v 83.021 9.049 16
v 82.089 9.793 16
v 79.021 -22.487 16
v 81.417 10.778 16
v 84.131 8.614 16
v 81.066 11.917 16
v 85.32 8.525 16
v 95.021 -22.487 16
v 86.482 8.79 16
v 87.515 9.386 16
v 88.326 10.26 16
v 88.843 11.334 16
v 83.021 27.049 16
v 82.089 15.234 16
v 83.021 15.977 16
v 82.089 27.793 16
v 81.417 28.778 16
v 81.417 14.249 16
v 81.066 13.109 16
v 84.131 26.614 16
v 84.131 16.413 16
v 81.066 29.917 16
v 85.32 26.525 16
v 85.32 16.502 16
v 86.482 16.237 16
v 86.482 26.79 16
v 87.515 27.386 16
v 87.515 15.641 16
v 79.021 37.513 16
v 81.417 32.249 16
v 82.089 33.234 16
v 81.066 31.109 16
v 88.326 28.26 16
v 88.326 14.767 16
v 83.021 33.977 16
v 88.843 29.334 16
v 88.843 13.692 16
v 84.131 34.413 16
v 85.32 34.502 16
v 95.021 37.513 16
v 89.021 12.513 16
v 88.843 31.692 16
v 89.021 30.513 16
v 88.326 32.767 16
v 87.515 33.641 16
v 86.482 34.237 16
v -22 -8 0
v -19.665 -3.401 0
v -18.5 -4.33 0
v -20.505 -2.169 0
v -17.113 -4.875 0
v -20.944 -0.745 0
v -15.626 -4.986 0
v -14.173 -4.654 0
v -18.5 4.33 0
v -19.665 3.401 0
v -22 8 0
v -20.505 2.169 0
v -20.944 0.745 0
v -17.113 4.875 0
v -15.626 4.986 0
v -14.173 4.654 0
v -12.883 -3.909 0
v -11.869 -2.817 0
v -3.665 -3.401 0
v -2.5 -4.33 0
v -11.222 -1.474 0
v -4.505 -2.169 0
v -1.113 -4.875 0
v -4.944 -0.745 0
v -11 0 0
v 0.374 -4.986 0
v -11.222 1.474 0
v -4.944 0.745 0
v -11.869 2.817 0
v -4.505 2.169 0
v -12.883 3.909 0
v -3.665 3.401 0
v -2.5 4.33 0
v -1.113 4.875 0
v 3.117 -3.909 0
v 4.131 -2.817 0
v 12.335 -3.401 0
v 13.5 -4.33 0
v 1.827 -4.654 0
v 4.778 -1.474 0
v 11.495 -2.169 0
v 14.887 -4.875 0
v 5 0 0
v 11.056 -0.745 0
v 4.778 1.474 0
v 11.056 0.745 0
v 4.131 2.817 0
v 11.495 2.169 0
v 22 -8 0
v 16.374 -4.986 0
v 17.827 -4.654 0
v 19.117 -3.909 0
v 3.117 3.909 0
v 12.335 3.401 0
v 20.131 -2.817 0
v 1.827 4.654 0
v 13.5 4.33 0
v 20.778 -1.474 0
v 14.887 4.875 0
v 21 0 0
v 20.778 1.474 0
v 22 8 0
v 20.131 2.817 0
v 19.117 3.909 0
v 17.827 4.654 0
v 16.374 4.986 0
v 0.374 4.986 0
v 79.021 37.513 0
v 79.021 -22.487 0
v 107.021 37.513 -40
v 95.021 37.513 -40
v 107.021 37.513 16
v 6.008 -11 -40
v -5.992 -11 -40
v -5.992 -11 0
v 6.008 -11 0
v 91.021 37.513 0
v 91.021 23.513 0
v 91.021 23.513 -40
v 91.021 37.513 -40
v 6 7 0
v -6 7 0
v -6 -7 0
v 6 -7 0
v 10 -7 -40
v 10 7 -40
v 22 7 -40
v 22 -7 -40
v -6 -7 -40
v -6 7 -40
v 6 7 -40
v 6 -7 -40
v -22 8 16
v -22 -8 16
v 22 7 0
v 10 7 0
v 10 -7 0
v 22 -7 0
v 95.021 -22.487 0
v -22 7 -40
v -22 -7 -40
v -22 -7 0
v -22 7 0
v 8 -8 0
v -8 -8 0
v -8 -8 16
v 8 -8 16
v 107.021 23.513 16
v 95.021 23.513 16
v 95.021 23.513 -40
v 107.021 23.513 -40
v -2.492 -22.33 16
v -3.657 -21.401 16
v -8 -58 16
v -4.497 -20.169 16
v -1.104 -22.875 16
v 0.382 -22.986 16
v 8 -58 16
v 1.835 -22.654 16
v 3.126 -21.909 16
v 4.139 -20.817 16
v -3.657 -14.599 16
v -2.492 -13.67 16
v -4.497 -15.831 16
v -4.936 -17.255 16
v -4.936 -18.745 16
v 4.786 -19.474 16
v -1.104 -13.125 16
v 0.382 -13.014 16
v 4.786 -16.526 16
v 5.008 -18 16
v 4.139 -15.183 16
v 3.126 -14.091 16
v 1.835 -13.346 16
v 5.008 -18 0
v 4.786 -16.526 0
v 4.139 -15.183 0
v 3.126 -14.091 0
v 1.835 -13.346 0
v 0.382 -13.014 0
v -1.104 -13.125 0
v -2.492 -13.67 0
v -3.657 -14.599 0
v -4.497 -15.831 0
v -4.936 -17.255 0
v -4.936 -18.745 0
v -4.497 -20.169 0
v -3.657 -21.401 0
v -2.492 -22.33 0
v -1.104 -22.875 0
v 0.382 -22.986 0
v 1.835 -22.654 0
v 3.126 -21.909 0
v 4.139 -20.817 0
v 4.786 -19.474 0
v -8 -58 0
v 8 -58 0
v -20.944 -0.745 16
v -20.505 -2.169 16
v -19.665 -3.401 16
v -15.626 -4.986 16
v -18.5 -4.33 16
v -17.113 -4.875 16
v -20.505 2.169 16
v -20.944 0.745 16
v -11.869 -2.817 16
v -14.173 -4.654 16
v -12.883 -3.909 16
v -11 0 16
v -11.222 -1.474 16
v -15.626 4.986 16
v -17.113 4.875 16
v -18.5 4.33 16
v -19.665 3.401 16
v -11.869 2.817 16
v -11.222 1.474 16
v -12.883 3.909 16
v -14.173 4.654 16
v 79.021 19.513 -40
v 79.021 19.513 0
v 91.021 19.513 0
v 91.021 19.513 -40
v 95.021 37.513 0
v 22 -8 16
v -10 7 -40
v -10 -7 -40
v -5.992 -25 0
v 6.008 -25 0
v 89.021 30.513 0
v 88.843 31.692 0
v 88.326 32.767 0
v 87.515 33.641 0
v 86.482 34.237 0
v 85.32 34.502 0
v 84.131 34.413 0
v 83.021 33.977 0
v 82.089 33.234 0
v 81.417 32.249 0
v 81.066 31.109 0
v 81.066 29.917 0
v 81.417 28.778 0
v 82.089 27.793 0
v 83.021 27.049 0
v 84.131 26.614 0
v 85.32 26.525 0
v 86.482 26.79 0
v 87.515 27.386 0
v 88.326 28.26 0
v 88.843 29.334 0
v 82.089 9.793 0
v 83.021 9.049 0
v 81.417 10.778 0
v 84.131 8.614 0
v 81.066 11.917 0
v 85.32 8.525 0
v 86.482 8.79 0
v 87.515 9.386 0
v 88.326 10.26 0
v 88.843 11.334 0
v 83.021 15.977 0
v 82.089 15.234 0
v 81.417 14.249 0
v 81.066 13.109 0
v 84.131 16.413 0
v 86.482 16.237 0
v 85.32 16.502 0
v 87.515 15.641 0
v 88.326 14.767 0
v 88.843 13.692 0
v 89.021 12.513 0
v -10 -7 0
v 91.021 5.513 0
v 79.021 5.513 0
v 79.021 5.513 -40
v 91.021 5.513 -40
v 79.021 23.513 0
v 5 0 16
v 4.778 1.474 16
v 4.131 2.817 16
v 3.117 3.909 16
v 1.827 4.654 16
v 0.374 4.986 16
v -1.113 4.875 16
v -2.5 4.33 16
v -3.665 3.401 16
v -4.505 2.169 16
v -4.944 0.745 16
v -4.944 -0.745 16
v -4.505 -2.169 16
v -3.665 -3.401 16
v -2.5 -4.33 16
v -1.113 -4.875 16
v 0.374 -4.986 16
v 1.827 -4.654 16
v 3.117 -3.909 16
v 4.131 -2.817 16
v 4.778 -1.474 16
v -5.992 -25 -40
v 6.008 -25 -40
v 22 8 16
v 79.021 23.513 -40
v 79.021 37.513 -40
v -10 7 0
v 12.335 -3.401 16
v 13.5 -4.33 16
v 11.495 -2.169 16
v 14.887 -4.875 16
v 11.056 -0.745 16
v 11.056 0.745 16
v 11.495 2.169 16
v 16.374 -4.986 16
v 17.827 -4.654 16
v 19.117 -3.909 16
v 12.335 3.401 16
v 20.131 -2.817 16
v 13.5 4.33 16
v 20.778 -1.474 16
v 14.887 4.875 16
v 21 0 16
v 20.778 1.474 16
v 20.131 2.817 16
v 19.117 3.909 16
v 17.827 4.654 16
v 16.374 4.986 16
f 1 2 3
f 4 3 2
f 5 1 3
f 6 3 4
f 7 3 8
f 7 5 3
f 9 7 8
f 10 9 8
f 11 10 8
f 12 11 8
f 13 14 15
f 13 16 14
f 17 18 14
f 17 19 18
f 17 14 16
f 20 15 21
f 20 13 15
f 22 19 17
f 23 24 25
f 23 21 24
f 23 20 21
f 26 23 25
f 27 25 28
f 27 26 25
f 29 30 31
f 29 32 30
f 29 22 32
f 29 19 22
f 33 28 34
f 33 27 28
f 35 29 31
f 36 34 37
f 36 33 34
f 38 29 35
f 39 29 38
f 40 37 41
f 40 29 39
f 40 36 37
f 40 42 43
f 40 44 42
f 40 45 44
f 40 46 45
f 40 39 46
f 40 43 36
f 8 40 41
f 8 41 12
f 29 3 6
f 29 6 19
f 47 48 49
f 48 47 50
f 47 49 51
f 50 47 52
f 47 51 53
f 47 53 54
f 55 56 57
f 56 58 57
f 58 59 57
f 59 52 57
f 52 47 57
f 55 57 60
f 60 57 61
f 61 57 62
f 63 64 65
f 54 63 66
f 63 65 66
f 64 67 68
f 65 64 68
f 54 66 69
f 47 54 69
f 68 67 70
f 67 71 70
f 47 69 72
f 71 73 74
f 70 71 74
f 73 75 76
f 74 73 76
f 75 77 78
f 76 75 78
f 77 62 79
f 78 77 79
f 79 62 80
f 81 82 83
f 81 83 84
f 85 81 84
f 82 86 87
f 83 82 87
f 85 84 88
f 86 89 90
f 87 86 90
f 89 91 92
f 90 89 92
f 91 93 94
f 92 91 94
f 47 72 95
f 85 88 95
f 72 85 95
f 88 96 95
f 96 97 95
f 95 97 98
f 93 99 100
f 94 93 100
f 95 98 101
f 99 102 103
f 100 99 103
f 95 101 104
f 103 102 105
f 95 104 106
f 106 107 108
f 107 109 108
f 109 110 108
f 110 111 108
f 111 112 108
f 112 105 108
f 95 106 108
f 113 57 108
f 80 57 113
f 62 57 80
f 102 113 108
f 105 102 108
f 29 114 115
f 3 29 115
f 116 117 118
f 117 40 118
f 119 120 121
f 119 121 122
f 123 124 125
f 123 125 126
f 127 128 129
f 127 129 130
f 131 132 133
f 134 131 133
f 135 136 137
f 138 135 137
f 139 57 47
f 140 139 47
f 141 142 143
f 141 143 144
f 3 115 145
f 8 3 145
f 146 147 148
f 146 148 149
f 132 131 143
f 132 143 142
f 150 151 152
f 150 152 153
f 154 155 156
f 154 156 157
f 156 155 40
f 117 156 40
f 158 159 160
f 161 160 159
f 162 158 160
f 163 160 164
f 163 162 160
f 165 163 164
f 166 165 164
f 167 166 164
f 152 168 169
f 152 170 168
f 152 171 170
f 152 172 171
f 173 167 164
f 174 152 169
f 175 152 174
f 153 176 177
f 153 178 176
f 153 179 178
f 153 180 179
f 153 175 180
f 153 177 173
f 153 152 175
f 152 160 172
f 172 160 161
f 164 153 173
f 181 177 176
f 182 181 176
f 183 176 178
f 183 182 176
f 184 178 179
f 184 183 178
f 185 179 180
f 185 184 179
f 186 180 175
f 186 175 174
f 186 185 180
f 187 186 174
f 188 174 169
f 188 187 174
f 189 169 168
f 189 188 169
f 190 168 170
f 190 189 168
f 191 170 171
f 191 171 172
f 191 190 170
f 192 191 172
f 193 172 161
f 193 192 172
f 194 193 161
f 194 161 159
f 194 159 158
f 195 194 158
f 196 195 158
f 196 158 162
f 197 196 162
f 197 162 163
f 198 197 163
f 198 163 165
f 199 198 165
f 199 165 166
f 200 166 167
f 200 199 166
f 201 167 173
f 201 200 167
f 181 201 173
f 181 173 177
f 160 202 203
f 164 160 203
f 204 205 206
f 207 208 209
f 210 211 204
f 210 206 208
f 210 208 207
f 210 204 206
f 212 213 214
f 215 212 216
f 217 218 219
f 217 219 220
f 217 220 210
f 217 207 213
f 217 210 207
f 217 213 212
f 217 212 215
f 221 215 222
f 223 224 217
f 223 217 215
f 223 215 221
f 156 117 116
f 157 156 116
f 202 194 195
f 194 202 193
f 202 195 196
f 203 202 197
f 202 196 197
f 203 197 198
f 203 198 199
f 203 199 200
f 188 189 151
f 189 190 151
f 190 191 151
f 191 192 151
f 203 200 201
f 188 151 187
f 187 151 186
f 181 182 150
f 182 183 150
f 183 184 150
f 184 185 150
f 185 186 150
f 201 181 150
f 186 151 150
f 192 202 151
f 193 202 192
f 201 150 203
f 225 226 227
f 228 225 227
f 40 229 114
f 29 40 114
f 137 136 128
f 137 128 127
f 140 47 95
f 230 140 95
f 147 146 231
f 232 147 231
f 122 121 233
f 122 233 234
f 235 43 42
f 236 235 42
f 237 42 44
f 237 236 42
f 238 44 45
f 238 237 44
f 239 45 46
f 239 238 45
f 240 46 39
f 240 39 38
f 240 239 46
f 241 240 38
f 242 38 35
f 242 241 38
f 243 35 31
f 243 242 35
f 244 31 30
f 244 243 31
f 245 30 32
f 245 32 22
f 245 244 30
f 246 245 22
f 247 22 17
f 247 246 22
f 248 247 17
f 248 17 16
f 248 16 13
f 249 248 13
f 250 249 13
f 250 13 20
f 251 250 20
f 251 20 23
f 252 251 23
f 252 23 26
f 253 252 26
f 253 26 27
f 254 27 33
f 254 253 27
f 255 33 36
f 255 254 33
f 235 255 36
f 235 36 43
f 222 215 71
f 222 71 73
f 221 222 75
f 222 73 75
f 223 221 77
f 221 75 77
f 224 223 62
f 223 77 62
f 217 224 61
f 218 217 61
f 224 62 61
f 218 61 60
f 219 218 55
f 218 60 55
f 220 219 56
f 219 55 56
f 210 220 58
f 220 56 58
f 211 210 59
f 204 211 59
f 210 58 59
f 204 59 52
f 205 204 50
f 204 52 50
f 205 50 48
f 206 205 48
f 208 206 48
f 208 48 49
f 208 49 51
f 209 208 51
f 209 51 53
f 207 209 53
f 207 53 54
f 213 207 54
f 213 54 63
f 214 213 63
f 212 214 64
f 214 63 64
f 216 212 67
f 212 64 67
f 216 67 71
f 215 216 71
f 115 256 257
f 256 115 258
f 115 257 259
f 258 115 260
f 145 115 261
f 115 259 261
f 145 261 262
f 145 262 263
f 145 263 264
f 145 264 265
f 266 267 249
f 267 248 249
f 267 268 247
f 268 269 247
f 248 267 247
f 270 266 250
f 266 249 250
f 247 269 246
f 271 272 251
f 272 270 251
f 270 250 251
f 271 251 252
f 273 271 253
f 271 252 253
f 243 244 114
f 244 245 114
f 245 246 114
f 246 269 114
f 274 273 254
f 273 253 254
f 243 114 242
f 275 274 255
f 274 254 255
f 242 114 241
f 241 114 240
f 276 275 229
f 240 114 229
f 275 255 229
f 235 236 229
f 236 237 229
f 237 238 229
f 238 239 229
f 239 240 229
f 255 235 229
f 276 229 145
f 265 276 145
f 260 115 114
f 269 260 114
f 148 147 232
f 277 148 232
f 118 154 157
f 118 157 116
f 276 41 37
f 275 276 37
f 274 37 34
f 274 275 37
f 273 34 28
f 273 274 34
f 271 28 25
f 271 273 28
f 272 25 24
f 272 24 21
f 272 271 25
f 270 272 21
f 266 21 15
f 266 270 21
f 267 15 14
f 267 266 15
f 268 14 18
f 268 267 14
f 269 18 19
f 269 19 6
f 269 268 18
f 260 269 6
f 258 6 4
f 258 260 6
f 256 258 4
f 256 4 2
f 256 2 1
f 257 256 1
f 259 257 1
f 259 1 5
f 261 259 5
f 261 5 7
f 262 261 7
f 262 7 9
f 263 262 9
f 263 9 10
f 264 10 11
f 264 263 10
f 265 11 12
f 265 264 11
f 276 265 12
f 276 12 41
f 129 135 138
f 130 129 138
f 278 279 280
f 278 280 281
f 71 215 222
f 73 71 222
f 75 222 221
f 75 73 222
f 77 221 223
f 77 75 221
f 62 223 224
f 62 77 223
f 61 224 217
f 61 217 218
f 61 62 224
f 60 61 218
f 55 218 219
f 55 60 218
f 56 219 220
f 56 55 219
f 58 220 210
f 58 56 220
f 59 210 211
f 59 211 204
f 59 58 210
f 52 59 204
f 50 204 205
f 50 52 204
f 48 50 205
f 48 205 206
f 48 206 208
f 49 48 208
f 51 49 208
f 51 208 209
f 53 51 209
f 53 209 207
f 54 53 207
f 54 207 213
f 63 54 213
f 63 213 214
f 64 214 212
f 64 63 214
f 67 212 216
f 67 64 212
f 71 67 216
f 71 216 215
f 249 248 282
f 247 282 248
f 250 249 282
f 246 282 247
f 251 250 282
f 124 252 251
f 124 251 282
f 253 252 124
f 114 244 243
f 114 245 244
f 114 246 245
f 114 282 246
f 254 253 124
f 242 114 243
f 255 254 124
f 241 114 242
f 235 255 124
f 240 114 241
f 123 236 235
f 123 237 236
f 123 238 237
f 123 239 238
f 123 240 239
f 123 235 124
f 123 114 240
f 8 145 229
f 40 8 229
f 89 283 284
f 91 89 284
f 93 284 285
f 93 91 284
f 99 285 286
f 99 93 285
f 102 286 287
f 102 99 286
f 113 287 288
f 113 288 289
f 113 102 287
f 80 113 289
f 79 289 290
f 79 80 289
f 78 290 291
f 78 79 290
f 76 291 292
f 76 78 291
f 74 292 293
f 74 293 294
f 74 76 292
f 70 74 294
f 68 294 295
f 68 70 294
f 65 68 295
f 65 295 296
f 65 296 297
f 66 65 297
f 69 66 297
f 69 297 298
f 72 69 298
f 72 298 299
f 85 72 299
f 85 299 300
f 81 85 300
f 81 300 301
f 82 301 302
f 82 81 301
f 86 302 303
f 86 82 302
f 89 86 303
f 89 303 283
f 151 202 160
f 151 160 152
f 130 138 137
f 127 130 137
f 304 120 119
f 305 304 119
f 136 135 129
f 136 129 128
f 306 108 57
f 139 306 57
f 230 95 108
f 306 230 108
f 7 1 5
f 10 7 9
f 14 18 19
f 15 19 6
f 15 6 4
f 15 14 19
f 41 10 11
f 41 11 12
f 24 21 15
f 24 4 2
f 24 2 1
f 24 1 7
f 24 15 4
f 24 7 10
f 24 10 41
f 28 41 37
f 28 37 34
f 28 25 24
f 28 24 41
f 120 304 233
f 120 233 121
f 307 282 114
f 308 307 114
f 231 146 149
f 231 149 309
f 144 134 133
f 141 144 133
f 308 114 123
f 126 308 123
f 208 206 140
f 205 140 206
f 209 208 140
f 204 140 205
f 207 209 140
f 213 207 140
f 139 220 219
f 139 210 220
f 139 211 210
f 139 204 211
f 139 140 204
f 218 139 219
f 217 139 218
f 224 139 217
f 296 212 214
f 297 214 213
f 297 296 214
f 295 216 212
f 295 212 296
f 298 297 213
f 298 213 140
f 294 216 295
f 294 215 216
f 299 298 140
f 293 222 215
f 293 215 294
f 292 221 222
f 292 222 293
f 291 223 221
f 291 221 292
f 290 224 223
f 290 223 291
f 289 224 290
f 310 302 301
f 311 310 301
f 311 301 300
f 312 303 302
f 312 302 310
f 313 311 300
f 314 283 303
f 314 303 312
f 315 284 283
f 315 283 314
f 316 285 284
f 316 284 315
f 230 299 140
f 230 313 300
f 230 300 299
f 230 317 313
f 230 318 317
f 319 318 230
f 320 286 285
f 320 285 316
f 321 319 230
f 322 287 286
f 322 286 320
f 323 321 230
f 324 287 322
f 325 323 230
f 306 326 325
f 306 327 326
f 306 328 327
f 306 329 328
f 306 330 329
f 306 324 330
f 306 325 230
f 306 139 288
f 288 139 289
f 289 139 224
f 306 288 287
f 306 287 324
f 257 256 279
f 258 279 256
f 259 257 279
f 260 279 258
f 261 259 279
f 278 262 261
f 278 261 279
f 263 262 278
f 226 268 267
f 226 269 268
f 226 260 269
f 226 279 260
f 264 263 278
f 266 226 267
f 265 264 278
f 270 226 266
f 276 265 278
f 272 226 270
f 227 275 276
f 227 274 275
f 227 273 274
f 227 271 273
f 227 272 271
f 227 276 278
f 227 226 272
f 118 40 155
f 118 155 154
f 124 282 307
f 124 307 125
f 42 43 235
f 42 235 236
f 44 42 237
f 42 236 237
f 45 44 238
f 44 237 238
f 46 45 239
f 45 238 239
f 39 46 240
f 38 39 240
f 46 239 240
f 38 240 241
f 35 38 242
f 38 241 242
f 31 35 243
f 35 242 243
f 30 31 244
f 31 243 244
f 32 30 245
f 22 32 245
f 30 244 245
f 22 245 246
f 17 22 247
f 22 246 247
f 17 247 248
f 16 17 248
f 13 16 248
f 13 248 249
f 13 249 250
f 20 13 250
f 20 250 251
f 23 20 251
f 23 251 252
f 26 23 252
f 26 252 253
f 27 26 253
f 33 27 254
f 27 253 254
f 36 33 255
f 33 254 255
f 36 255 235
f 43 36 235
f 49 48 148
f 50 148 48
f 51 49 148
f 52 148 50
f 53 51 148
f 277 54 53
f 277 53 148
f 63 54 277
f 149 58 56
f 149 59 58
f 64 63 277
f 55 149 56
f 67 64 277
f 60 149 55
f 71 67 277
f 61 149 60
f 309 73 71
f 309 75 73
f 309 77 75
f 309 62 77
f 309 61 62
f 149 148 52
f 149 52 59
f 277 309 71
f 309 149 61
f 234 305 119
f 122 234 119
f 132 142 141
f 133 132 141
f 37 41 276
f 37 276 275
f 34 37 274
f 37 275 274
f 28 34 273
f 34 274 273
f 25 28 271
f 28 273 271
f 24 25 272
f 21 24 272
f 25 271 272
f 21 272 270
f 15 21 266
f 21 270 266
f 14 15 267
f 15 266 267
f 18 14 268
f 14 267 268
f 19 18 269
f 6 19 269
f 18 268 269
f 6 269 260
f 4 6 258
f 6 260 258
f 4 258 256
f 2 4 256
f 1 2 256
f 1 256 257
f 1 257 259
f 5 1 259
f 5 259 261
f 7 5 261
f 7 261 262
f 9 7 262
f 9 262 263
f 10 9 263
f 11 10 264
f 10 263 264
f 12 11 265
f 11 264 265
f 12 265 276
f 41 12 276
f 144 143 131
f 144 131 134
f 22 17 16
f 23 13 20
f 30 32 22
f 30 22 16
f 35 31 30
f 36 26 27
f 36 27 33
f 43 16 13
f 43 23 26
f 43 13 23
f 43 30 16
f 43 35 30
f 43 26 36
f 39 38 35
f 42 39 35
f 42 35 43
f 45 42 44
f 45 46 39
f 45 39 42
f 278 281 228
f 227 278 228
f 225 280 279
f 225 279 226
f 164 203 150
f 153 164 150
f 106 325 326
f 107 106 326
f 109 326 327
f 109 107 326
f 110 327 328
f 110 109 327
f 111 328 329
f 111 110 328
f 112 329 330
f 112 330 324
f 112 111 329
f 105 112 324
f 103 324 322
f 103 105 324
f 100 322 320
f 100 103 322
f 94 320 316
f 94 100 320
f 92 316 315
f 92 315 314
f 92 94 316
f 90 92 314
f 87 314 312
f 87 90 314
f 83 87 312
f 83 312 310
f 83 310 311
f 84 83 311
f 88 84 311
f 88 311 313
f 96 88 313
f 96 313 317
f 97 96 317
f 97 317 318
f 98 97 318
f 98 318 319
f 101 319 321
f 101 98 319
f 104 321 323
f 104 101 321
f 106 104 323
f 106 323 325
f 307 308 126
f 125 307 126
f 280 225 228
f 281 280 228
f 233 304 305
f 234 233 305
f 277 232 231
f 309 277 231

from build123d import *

# Parameters (mm, degrees)
F0_W      = 12
F0_H      = 14
F0_R      = 5
F1_DEPTH  = 16
F2_DEPTH  = 40
F0_W_2    = 16
F0_H_2    = 50
F3_DEPTH  = 16
F4_DEPTH  = 16
F0_R_2    = 4
F5_DEPTH  = 16
F6_DEPTH  = 16
F7_DEPTH  = 40
F8_DEPTH  = 40
F9_DEPTH  = 16
F10_DEPTH = 16
F11_DEPTH = 40


with BuildPart() as f1:
    # F0 (on Top) → F1 (new body)
    with BuildSketch(Plane.XY):
        Polygon((8, -8), (22, -8), (22, -7), (10, -7), (10, 7), (22, 7), (22, 8), (-22, 8), (-22, 7), (-10, 7), (-10, -7), (-22, -7), (-22, -8), (-8, -8), align=None)
        Rectangle(F0_W, F0_H, mode=Mode.SUBTRACT)
        with Locations((-16, 0)):
            Rectangle(F0_W, F0_H)
        with Locations((-16, 0)):
            Circle(F0_R, mode=Mode.SUBTRACT)
        Rectangle(F0_W, F0_H)
        Circle(F0_R, mode=Mode.SUBTRACT)
        with Locations((16, 0)):
            Rectangle(F0_W, F0_H)
        with Locations((16, 0)):
            Circle(F0_R, mode=Mode.SUBTRACT)
    extrude(amount=F1_DEPTH)


with BuildPart() as f2:
    # F0 (on Top) → F2 (new body)
    with BuildSketch(Plane.XY):
        with Locations((-16, 0)):
            Rectangle(F0_W, F0_H)
        with Locations((-16, 0)):
            Circle(F0_R, mode=Mode.SUBTRACT)
        with Locations((-16, 0)):
            Circle(F0_R)
    extrude(amount=-F2_DEPTH)

    # F0 (on Top) → F4 (join)
    with BuildSketch(Plane.XY):
        with Locations((-16, 0)):
            Circle(F0_R)
    extrude(amount=F4_DEPTH)


with BuildPart() as f2b:
    # F0 (on Top) → F2, piece 2 (new body)
    with BuildSketch(Plane.XY):
        Rectangle(F0_W, F0_H)
        Circle(F0_R, mode=Mode.SUBTRACT)
        Circle(F0_R)
    extrude(amount=-F2_DEPTH)


with BuildPart() as f2c:
    # F0 (on Top) → F2, piece 3 (new body)
    with BuildSketch(Plane.XY):
        with Locations((16, 0)):
            Rectangle(F0_W, F0_H)
        with Locations((16, 0)):
            Circle(F0_R, mode=Mode.SUBTRACT)
        with Locations((16, 0)):
            Circle(F0_R)
    extrude(amount=-F2_DEPTH)


with BuildPart() as f2d:
    # F0 (on Top) → F2, piece 4 (new body)
    with BuildSketch(Plane.XY):
        with Locations((0.0081723034, -18)):
            Rectangle(F0_W, F0_H)
        with Locations((0.0081723034, -18)):
            Circle(F0_R, mode=Mode.SUBTRACT)
        with Locations((0.0081723034, -18)):
            Circle(F0_R)
    extrude(amount=-F2_DEPTH)


with BuildPart() as f3:
    # F0 (on Top) → F3 (new body)
    with BuildSketch(Plane.XY):
        with Locations((0, -33)):
            Rectangle(F0_W_2, F0_H_2)
        with Locations((0.0081723034, -18)):
            Rectangle(F0_W, F0_H, mode=Mode.SUBTRACT)
        with Locations((0.0081723034, -18)):
            Rectangle(F0_W, F0_H)
        with Locations((0.0081723034, -18)):
            Circle(F0_R, mode=Mode.SUBTRACT)
    extrude(amount=F3_DEPTH)


with BuildPart() as f5:
    # F0 (on Top) → F5 (new body)
    with BuildSketch(Plane.XY):
        Polygon((79.0210366249, -22.486673668), (95.0210366249, -22.486673668), (95.0210366249, 23.513326332), (95.0210366249, 37.513326332), (91.0210366249, 37.513326332), (91.0210366249, 23.513326332), (79.0210366249, 23.513326332), (79.0210366249, 19.513326332), (91.0210366249, 19.513326332), (91.0210366249, 5.513326332), (79.0210366249, 5.513326332), align=None)
        with Locations((85.0210366249, 12.513326332)):
            Rectangle(F0_W, F0_H)
        with Locations((85.0210366249, 12.513326332)):
            Circle(F0_R_2, mode=Mode.SUBTRACT)
        with Locations((85.0210366249, 30.513326332)):
            Rectangle(F0_W, F0_H)
        with Locations((85.0210366249, 30.513326332)):
            Circle(F0_R_2, mode=Mode.SUBTRACT)
    extrude(amount=F5_DEPTH)


with BuildPart() as f6:
    # F0 (on Top) → F6 (new body)
    with BuildSketch(Plane.XY):
        with Locations((101.0210366249, 30.513326332)):
            Rectangle(F0_W, F0_H)
    extrude(amount=F6_DEPTH)

    # F0 (on Top) → F7 (join)
    with BuildSketch(Plane.XY):
        with Locations((101.0210366249, 30.513326332)):
            Rectangle(F0_W, F0_H)
    extrude(amount=-F7_DEPTH)


with BuildPart() as f8:
    # F0 (on Top) → F8 (new body)
    with BuildSketch(Plane.XY):
        with Locations((85.0210366249, 30.513326332)):
            Rectangle(F0_W, F0_H)
        with Locations((85.0210366249, 30.513326332)):
            Circle(F0_R_2, mode=Mode.SUBTRACT)
        with Locations((85.0210366249, 30.513326332)):
            Circle(F0_R_2)
    extrude(amount=-F8_DEPTH)

    # F0 (on Top) → F9 (join)
    with BuildSketch(Plane.XY):
        with Locations((85.0210366249, 30.513326332)):
            Circle(F0_R_2)
    extrude(amount=F9_DEPTH)


with BuildPart() as f10:
    # F0 (on Top) → F10 (new body)
    with BuildSketch(Plane.XY):
        with Locations((85.0210366249, 12.513326332)):
            Circle(F0_R_2)
    extrude(amount=F10_DEPTH)

    # F0 (on Top) → F11 (join)
    with BuildSketch(Plane.XY):
        with Locations((85.0210366249, 12.513326332)):
            Rectangle(F0_W, F0_H)
        with Locations((85.0210366249, 12.513326332)):
            Circle(F0_R_2, mode=Mode.SUBTRACT)
        with Locations((85.0210366249, 12.513326332)):
            Circle(F0_R_2)
    extrude(amount=-F11_DEPTH)


solid = Compound([f1.part, f2.part, f2b.part, f2c.part, f2d.part, f3.part, f5.part, f6.part, f8.part, f10.part])
